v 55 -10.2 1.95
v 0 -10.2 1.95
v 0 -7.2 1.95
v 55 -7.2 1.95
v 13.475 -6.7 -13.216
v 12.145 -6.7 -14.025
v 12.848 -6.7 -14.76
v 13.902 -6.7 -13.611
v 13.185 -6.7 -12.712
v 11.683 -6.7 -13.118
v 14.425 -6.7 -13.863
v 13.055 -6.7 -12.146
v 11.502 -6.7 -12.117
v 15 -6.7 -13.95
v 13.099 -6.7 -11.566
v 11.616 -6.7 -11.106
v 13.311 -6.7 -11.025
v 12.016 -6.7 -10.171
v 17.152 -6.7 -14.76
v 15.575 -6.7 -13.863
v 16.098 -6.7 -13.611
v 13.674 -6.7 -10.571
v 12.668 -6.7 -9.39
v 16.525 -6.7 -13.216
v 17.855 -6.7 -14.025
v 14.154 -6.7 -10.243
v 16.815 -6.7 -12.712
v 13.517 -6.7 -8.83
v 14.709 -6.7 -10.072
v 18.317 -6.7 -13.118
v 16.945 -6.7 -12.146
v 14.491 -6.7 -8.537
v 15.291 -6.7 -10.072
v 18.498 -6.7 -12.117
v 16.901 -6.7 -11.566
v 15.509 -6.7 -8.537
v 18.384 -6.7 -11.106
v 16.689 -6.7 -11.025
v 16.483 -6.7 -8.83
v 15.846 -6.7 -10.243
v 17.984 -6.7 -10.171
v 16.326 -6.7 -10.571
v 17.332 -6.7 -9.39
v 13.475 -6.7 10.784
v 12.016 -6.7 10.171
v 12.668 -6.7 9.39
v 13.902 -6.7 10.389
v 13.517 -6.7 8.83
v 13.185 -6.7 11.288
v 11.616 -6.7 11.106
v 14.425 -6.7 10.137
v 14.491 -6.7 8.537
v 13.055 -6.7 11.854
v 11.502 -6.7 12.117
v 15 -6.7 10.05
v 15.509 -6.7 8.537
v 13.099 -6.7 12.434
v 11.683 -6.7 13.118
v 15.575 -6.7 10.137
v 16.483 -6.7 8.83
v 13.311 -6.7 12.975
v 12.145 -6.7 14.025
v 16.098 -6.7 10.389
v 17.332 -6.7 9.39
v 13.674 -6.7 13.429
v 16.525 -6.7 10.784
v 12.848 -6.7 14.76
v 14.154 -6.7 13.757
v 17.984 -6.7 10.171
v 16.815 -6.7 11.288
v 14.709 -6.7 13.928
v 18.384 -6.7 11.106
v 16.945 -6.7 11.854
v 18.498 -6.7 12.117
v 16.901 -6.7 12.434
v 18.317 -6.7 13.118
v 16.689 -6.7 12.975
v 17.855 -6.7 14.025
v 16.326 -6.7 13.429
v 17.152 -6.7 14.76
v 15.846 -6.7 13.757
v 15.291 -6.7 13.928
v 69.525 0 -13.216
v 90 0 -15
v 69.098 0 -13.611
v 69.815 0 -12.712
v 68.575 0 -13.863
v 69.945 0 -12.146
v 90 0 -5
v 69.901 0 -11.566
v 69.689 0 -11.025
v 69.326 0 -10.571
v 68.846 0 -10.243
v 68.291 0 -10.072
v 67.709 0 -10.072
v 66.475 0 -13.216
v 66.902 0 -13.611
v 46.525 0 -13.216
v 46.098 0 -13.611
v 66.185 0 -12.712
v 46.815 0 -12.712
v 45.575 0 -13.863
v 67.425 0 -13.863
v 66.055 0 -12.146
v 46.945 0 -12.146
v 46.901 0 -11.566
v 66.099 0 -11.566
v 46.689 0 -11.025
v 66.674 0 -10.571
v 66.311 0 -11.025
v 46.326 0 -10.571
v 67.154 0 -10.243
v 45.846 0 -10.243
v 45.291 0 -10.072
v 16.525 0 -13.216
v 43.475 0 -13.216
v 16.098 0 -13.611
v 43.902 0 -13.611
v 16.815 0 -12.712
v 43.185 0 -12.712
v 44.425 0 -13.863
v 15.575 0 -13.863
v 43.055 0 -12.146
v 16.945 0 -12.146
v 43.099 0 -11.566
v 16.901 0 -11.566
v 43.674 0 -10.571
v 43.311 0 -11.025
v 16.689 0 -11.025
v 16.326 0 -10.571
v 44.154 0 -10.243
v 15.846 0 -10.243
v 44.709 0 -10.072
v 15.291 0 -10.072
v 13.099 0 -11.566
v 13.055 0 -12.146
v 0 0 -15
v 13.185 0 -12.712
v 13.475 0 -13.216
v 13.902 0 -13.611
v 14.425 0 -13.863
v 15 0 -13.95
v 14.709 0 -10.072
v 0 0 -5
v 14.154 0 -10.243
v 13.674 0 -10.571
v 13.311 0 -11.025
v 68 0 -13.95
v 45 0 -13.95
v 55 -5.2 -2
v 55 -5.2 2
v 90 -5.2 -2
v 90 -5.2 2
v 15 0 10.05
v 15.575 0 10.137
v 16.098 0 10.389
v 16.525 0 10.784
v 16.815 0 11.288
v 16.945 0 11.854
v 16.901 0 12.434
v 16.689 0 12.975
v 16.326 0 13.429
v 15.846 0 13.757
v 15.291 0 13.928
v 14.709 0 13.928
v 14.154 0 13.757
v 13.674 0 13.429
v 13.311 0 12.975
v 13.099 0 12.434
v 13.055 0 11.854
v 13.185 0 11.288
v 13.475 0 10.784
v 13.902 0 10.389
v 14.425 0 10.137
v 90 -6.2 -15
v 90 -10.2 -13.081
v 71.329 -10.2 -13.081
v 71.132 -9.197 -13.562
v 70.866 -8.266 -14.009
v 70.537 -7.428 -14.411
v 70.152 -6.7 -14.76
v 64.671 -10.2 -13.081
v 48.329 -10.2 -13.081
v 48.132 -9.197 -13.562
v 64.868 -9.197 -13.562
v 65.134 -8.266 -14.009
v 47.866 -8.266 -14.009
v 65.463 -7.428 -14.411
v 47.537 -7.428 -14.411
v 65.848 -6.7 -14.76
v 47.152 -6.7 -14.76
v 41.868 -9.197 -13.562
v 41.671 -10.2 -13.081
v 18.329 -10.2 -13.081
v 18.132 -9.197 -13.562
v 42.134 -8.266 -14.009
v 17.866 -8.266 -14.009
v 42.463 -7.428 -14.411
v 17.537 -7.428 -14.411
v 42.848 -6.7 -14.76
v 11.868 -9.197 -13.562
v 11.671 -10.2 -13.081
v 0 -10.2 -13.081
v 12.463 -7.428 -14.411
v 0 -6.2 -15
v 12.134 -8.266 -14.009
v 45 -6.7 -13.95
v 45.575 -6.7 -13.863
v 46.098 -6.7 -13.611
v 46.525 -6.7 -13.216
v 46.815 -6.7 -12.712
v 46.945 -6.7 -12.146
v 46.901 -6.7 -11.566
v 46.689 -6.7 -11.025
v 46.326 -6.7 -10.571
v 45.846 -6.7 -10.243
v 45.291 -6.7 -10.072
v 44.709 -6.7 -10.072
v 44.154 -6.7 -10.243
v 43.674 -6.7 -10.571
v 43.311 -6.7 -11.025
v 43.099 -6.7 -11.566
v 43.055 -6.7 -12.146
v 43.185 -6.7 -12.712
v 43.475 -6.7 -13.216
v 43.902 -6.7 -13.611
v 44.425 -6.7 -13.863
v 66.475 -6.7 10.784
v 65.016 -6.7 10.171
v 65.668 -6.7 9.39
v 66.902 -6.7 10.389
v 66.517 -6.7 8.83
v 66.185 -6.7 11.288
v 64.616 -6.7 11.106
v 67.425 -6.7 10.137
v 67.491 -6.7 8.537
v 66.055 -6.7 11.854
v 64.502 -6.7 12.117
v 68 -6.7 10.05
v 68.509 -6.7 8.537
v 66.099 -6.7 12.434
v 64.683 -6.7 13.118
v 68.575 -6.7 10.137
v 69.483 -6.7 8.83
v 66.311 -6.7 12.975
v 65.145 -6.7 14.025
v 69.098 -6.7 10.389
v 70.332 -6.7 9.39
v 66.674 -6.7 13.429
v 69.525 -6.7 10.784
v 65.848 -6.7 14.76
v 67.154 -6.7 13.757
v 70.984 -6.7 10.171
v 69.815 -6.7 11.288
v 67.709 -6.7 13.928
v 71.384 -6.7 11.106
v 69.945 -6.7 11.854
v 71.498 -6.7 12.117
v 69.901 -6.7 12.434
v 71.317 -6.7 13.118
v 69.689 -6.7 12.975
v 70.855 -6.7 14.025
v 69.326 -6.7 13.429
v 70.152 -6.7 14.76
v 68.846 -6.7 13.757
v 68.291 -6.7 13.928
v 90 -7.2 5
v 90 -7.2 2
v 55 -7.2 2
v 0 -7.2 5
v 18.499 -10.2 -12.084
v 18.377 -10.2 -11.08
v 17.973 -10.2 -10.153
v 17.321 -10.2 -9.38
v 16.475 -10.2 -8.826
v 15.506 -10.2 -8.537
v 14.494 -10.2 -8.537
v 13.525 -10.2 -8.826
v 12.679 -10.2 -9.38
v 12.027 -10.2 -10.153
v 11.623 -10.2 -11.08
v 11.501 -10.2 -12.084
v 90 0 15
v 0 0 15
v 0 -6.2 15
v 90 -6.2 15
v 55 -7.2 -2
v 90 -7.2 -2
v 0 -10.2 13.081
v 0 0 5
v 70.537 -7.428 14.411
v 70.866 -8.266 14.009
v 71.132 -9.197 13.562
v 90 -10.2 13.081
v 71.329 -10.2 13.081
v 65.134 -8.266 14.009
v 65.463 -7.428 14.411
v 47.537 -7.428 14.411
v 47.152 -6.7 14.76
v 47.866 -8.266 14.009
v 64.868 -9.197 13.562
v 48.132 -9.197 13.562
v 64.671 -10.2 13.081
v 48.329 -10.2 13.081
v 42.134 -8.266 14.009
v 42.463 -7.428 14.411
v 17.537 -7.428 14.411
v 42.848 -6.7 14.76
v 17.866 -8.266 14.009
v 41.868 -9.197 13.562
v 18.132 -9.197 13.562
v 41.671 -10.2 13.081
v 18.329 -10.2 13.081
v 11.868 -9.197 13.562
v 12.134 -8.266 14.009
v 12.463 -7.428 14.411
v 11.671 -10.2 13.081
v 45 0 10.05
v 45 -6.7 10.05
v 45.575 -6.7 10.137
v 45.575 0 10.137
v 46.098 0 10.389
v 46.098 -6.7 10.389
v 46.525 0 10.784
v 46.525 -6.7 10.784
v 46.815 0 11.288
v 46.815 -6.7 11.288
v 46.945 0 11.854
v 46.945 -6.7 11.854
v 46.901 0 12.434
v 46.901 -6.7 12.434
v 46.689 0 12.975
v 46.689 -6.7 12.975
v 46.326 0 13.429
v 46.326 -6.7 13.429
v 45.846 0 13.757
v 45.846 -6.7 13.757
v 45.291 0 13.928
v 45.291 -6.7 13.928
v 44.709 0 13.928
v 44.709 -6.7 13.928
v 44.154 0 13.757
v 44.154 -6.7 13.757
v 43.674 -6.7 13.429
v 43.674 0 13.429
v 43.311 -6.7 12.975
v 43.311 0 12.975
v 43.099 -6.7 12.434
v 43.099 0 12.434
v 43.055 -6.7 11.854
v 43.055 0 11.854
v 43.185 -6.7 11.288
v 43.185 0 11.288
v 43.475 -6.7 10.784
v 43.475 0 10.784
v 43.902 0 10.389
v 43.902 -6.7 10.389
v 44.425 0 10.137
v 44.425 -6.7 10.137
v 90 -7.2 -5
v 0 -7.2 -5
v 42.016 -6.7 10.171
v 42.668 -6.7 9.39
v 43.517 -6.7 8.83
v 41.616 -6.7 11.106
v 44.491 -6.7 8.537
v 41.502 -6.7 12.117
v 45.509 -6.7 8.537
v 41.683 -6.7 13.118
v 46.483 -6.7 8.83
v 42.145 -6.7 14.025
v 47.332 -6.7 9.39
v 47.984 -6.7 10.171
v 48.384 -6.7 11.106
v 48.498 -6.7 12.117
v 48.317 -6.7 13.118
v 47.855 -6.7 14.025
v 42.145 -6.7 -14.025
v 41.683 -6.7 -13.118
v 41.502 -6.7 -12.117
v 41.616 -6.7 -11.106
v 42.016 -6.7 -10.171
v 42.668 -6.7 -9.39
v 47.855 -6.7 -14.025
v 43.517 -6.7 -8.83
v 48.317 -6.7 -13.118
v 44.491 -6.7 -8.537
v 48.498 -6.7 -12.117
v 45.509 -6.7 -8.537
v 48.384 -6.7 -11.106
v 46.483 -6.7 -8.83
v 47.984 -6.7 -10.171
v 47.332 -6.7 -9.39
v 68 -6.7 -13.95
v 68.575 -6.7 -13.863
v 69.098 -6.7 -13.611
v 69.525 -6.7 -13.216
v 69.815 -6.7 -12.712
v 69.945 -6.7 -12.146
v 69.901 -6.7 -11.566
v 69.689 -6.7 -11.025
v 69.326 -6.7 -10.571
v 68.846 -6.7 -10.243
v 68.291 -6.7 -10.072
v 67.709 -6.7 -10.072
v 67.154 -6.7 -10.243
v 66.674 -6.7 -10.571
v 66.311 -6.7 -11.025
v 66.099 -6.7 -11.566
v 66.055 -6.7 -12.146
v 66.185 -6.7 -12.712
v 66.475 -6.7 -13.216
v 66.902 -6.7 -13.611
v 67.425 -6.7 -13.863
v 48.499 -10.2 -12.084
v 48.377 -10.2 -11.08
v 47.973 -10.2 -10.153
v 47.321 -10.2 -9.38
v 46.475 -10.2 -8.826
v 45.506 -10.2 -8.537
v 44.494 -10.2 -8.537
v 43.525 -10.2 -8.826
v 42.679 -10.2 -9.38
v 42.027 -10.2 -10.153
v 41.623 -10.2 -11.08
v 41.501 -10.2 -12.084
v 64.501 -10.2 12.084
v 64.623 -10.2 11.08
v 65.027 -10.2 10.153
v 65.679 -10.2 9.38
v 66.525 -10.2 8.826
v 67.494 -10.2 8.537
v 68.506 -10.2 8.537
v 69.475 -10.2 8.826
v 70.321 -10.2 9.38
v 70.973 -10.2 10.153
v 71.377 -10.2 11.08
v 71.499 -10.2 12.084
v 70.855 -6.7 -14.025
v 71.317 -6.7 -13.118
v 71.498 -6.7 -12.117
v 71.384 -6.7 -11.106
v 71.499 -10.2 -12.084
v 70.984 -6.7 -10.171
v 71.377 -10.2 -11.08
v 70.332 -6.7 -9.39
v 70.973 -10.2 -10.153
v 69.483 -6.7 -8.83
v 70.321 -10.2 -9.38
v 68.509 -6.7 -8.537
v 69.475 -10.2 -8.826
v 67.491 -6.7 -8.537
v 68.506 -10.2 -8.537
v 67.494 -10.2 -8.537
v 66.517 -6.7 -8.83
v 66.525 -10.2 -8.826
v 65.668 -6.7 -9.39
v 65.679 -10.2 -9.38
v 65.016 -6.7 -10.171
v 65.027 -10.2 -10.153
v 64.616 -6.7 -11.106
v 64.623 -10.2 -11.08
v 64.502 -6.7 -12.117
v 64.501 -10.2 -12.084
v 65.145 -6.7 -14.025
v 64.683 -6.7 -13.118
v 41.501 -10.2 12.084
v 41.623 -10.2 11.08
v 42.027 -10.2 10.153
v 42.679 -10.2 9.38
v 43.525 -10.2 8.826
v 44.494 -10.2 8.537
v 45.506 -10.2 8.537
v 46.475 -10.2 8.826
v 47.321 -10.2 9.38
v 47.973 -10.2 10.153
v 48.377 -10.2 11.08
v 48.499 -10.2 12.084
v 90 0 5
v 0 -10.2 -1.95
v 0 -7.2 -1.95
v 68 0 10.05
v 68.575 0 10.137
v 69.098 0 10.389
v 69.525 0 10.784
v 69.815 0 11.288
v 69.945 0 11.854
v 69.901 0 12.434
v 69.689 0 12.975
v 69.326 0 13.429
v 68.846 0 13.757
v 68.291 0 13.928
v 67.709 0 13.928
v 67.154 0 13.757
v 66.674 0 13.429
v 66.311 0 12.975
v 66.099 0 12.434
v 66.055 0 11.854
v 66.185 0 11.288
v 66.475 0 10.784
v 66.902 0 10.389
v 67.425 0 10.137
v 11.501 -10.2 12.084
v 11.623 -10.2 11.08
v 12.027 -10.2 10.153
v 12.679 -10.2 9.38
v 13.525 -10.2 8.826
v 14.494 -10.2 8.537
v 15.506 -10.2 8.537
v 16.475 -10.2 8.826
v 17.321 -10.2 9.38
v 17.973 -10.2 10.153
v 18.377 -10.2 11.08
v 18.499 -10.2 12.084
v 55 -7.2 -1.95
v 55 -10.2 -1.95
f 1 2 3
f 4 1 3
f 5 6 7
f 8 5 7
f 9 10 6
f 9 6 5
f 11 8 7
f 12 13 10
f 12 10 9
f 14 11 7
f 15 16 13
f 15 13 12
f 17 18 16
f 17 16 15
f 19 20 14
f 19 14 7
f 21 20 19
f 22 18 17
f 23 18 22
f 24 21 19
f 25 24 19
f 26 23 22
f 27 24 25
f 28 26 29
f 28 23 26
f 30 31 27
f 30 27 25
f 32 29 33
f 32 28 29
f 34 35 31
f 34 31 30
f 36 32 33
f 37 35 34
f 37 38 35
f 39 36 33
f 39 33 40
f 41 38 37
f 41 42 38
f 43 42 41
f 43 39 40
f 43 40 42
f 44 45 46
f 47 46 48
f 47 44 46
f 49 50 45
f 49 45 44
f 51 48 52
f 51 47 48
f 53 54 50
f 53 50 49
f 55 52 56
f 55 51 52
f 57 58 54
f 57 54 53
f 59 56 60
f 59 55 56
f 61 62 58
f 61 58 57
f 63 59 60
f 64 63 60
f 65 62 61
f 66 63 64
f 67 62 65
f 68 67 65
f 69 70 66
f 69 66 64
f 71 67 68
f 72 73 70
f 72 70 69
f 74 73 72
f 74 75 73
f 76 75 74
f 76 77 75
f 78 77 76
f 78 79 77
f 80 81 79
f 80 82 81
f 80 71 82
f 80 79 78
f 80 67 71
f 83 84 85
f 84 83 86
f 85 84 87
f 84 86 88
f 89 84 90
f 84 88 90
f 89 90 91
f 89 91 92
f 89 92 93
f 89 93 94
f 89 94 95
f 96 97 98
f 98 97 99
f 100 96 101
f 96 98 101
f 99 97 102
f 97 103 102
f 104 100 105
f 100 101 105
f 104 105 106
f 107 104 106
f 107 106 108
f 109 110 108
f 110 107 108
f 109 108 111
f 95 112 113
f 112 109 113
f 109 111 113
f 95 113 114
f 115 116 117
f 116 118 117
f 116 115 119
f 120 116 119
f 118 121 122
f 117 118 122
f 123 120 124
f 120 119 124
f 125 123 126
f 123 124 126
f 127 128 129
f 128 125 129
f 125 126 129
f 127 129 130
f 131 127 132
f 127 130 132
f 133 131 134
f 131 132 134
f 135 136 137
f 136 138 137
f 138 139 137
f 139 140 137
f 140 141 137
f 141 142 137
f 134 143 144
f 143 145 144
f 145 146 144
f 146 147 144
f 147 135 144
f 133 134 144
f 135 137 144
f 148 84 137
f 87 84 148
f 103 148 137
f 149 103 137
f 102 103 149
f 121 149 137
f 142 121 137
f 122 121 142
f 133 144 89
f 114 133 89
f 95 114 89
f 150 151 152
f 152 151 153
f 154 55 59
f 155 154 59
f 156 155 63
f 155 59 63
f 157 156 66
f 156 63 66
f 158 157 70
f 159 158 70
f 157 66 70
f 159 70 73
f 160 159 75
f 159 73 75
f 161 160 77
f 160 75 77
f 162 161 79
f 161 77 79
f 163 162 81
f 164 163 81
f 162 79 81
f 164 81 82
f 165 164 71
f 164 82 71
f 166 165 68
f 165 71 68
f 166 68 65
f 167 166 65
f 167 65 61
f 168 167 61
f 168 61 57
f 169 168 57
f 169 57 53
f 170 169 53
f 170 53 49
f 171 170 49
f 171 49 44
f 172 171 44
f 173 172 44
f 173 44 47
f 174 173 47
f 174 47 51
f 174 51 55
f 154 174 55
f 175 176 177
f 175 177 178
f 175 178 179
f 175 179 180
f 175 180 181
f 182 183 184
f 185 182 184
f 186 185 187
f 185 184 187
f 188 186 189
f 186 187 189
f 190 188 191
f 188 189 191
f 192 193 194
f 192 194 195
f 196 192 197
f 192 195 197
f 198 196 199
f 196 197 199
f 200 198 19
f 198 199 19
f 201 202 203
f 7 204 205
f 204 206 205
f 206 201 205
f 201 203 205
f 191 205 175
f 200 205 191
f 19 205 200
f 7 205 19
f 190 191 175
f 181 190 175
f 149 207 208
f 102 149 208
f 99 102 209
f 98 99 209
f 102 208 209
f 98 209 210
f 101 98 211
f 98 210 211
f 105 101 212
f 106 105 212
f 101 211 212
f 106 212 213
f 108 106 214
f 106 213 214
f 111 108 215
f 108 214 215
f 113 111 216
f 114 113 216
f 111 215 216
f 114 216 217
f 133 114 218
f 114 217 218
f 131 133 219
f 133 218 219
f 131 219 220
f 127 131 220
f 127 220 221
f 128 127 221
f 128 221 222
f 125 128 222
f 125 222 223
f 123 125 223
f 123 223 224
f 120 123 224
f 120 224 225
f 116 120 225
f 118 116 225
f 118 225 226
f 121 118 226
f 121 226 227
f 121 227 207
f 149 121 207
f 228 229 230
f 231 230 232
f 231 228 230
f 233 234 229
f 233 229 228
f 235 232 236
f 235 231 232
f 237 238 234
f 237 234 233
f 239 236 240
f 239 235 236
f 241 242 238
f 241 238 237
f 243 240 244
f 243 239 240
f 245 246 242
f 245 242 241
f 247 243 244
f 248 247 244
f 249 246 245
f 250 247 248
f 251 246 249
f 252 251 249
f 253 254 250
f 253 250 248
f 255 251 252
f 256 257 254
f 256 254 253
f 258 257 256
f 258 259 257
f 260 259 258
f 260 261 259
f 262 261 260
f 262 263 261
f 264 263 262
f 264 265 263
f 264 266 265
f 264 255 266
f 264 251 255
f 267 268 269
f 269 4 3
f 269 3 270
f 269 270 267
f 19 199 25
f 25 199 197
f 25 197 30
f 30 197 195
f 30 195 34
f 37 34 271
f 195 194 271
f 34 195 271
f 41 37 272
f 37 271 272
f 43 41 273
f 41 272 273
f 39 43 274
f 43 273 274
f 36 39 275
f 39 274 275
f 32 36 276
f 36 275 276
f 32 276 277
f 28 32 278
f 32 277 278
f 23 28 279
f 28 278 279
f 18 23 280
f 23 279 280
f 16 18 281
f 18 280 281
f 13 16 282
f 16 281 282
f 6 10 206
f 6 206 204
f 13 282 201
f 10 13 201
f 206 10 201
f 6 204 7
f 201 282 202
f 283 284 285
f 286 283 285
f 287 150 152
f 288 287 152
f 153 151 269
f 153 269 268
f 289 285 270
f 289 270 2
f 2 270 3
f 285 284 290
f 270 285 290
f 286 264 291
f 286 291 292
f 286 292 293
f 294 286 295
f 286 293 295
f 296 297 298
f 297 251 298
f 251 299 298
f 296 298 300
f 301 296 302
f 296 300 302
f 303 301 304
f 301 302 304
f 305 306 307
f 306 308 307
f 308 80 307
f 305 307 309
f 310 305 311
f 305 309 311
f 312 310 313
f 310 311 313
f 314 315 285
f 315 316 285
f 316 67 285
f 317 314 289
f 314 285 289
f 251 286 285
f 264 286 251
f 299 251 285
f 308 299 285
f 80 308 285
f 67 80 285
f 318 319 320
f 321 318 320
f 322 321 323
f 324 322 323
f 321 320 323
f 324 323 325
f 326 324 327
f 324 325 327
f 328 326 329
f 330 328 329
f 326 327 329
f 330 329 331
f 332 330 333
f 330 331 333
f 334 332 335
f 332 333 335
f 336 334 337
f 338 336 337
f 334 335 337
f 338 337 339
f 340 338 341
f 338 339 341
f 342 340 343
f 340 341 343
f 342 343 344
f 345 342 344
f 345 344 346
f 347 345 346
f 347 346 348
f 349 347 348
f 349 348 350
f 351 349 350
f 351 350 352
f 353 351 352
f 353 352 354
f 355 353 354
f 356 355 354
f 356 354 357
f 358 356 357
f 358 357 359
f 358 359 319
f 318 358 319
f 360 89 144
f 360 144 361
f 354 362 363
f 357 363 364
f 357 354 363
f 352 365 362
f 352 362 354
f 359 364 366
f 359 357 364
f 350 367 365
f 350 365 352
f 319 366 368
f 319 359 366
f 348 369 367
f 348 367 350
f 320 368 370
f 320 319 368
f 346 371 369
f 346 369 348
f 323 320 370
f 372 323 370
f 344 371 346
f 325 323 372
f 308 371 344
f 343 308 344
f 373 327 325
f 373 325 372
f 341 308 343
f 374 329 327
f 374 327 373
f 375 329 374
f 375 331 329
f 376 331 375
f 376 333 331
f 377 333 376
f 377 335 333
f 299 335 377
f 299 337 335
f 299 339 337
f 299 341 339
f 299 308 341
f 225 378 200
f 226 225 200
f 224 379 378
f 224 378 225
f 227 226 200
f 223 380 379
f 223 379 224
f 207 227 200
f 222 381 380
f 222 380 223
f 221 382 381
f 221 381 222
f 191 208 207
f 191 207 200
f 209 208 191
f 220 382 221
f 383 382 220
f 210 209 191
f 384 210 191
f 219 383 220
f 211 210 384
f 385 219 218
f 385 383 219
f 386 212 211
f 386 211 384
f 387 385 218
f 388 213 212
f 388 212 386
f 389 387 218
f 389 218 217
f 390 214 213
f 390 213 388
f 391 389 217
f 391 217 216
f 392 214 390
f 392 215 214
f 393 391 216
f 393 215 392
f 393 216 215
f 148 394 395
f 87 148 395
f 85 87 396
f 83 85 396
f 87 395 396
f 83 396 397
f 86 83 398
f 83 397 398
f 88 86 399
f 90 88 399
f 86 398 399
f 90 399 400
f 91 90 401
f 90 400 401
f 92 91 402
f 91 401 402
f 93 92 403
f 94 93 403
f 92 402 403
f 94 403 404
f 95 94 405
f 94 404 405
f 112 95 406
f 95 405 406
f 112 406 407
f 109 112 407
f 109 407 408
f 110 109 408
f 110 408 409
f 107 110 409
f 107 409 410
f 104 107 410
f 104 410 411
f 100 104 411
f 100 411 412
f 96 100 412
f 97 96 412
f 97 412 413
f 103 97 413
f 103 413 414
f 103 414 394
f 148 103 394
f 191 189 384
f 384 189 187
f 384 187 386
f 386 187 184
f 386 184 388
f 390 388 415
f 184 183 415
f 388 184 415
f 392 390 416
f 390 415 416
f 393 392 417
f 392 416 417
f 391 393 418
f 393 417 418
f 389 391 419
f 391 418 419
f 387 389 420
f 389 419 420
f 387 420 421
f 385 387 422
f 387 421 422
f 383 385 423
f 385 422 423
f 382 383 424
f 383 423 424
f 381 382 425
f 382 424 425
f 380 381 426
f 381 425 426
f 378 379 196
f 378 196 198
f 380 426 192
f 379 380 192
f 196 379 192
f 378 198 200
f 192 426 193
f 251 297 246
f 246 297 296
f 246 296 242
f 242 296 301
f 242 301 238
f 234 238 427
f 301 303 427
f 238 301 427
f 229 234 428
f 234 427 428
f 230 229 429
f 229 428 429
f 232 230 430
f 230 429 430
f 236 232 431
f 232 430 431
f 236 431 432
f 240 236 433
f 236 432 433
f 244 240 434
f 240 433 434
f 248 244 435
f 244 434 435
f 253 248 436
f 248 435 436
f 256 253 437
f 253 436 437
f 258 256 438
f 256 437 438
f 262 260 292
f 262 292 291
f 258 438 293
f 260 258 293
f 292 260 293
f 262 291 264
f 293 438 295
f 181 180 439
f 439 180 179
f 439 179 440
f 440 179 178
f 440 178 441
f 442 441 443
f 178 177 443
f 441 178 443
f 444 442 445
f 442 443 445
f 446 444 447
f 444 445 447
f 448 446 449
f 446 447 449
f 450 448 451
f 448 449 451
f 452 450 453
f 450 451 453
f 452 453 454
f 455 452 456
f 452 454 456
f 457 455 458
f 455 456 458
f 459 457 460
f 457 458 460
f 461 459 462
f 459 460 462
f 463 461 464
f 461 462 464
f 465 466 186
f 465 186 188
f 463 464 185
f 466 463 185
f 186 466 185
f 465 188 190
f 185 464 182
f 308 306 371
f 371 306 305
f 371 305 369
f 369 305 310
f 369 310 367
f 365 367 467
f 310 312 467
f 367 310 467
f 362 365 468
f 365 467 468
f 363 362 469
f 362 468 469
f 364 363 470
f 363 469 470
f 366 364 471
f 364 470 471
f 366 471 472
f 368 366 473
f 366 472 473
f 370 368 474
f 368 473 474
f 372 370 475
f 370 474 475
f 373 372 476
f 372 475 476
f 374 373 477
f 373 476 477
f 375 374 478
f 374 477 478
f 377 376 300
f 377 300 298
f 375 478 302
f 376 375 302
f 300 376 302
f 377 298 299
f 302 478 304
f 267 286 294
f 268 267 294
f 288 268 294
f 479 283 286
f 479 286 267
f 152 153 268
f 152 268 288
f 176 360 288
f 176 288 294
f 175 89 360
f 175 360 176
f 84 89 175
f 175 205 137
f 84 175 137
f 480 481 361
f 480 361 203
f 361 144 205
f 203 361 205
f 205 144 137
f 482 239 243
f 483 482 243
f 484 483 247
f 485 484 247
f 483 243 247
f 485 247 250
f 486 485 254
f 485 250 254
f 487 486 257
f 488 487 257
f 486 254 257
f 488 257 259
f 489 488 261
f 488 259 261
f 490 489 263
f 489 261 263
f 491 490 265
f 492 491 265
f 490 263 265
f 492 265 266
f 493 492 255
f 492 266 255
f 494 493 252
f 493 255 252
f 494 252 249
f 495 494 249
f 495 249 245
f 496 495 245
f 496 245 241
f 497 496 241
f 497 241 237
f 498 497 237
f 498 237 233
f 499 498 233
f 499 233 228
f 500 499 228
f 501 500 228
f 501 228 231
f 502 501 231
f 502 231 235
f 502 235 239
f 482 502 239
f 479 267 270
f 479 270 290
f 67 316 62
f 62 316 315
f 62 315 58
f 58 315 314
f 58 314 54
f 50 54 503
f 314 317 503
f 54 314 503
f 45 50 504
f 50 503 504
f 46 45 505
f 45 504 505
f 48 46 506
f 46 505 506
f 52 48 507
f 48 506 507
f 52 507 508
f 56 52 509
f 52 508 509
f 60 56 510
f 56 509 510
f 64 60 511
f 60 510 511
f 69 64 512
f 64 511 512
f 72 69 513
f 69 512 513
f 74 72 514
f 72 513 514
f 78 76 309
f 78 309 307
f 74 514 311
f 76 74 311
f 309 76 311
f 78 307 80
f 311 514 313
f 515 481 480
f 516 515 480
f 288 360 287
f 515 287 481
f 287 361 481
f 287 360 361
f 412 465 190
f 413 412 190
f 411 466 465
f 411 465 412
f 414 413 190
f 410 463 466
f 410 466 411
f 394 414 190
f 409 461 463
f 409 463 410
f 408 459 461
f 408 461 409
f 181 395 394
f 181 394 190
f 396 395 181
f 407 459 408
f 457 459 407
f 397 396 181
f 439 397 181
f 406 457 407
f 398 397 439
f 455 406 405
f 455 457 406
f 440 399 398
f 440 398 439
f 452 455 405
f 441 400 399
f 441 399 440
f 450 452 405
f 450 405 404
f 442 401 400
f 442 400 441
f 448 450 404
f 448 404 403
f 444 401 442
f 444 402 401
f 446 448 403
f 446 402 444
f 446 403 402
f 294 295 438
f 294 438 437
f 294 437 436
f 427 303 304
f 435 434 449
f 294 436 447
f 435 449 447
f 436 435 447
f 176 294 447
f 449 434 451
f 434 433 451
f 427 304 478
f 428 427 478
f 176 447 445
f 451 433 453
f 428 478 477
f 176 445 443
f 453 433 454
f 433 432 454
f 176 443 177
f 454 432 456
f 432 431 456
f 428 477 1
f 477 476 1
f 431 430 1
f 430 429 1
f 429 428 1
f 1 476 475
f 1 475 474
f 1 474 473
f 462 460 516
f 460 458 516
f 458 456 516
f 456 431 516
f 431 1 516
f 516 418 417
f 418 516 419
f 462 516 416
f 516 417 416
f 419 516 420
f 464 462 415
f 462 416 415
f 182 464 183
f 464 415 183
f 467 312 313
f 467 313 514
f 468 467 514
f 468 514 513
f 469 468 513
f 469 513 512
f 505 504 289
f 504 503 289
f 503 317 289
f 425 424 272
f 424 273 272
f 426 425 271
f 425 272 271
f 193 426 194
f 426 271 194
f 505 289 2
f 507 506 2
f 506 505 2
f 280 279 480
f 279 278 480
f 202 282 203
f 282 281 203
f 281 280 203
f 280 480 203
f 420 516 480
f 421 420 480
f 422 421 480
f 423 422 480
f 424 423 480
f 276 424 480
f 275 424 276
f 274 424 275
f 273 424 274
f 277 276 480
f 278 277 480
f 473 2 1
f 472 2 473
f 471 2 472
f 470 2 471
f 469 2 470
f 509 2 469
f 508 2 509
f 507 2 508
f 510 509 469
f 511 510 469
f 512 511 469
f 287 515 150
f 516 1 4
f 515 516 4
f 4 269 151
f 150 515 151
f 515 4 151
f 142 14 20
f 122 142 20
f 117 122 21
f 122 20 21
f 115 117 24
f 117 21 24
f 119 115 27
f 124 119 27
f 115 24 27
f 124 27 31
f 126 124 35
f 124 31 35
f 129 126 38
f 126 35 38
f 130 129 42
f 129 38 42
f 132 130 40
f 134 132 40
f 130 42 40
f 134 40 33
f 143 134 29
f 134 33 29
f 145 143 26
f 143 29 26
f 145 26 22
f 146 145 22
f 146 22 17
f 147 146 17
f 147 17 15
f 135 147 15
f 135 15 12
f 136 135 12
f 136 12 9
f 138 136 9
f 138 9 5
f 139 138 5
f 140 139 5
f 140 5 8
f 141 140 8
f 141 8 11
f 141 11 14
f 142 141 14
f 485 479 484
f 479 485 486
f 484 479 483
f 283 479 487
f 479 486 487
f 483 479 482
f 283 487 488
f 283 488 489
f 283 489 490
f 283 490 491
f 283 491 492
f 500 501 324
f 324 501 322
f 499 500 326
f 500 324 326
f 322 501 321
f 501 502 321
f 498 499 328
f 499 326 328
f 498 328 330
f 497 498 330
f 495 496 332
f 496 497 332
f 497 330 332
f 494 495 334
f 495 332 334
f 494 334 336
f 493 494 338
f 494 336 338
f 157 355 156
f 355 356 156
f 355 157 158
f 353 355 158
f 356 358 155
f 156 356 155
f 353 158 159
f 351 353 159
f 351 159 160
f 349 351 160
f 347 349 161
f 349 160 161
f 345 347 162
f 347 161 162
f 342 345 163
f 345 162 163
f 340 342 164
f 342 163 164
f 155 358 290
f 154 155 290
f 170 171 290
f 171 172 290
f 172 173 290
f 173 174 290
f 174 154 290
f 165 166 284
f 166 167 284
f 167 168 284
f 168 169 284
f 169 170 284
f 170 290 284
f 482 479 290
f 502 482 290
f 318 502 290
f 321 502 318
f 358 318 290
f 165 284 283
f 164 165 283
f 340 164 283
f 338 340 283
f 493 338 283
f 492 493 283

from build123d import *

# Parameters (mm, degrees)
EXTRUDE_1_DEPTH     = 90
EXTRUDE_1_2_DEPTH   = 90
SKETCH_3_R          = 1.95
CUT_EXTRUDE_1_DEPTH = 92.809803398
SKETCH_5_W          = 35
SKETCH_5_H          = 5
EXTRUDE_2_DEPTH     = 2
SKETCH_7_R          = 3.5
CUT_EXTRUDE_2_DEPTH = 3.5


with BuildPart() as part:
    # 스케치1 → 보스-돌출1 (new body)
    with BuildSketch(Plane(origin=(0, 0, 0), x_dir=(0, 0, -1), z_dir=(1, 0, 0))):
        Polygon((-15, 0), (-15, -6.2), (-13.081136552, -10.2), (-1.95, -10.2), (-1.95, -7.2), (-5, -7.2), (-5, 0), align=None)
    extrude(amount=EXTRUDE_1_DEPTH)


with BuildPart() as body_2:
    # 스케치1 → Extrude 1 2 (new body)
    with BuildSketch(Plane(origin=(0, 0, 0), x_dir=(0, 0, -1), z_dir=(1, 0, 0))):
        Polygon((13.081136552, -10.2), (15, -6.2), (15, 0), (5, 0), (5, -7.2), (1.95, -7.2), (1.95, -10.2), align=None)
    extrude(amount=EXTRUDE_1_2_DEPTH)


with BuildPart() as cut_extrude_1_tool:
    # 스케치3 → 컷-돌출1 (new, through all)
    with BuildSketch(Plane.XZ.offset(10.2)):
        with Locations(Location((15, 12, 0), (0, 0, 270))):
            Circle(SKETCH_3_R)
        with Locations(Location((45, 12, 0), (0, 0, 270))):
            Circle(SKETCH_3_R)
        with Locations(Location((68, 12, 0), (0, 0, 270))):
            Circle(SKETCH_3_R)
        with Locations(Location((68, -12, 0), (0, 0, 270))):
            Circle(SKETCH_3_R)
        with Locations(Location((45, -12, 0), (0, 0, 270))):
            Circle(SKETCH_3_R)
        with Locations(Location((15, -12, 0), (0, 0, 270))):
            Circle(SKETCH_3_R)
    extrude(amount=-CUT_EXTRUDE_1_DEPTH)


with BuildPart() as part_1:
    add(part.part)

    # 컷-돌출1: cut by cut_extrude_1_tool
    add(cut_extrude_1_tool.part, mode=Mode.SUBTRACT)



with BuildPart() as body_2_1:
    add(body_2.part)

    # 컷-돌출1: cut by cut_extrude_1_tool
    add(cut_extrude_1_tool.part, mode=Mode.SUBTRACT)


with BuildPart() as part_2:
    add(part_1.part)

    add(body_2_1.part)  # 보스-돌출2 merges body 2
    # 스케치5 → 보스-돌출2 (add, symmetric)
    with BuildSketch(Plane.XY):
        with Locations((72.5, -7.7)):
            Rectangle(SKETCH_5_W, SKETCH_5_H)
    extrude(amount=EXTRUDE_2_DEPTH, both=True)

    # 스케치7 → 컷-돌출2 (cut)
    with BuildSketch(Plane.XZ.offset(10.2)):
        with Locations((15, -12)):
            Circle(SKETCH_7_R)
        with Locations((45, -12)):
            Circle(SKETCH_7_R)
        with Locations((68, -12)):
            Circle(SKETCH_7_R)
        with Locations((45, 12)):
            Circle(SKETCH_7_R)
        with Locations((68, 12)):
            Circle(SKETCH_7_R)
        with Locations((15, 12)):
            Circle(SKETCH_7_R)
    extrude(amount=-CUT_EXTRUDE_2_DEPTH, mode=Mode.SUBTRACT)


solid = part_2.part
